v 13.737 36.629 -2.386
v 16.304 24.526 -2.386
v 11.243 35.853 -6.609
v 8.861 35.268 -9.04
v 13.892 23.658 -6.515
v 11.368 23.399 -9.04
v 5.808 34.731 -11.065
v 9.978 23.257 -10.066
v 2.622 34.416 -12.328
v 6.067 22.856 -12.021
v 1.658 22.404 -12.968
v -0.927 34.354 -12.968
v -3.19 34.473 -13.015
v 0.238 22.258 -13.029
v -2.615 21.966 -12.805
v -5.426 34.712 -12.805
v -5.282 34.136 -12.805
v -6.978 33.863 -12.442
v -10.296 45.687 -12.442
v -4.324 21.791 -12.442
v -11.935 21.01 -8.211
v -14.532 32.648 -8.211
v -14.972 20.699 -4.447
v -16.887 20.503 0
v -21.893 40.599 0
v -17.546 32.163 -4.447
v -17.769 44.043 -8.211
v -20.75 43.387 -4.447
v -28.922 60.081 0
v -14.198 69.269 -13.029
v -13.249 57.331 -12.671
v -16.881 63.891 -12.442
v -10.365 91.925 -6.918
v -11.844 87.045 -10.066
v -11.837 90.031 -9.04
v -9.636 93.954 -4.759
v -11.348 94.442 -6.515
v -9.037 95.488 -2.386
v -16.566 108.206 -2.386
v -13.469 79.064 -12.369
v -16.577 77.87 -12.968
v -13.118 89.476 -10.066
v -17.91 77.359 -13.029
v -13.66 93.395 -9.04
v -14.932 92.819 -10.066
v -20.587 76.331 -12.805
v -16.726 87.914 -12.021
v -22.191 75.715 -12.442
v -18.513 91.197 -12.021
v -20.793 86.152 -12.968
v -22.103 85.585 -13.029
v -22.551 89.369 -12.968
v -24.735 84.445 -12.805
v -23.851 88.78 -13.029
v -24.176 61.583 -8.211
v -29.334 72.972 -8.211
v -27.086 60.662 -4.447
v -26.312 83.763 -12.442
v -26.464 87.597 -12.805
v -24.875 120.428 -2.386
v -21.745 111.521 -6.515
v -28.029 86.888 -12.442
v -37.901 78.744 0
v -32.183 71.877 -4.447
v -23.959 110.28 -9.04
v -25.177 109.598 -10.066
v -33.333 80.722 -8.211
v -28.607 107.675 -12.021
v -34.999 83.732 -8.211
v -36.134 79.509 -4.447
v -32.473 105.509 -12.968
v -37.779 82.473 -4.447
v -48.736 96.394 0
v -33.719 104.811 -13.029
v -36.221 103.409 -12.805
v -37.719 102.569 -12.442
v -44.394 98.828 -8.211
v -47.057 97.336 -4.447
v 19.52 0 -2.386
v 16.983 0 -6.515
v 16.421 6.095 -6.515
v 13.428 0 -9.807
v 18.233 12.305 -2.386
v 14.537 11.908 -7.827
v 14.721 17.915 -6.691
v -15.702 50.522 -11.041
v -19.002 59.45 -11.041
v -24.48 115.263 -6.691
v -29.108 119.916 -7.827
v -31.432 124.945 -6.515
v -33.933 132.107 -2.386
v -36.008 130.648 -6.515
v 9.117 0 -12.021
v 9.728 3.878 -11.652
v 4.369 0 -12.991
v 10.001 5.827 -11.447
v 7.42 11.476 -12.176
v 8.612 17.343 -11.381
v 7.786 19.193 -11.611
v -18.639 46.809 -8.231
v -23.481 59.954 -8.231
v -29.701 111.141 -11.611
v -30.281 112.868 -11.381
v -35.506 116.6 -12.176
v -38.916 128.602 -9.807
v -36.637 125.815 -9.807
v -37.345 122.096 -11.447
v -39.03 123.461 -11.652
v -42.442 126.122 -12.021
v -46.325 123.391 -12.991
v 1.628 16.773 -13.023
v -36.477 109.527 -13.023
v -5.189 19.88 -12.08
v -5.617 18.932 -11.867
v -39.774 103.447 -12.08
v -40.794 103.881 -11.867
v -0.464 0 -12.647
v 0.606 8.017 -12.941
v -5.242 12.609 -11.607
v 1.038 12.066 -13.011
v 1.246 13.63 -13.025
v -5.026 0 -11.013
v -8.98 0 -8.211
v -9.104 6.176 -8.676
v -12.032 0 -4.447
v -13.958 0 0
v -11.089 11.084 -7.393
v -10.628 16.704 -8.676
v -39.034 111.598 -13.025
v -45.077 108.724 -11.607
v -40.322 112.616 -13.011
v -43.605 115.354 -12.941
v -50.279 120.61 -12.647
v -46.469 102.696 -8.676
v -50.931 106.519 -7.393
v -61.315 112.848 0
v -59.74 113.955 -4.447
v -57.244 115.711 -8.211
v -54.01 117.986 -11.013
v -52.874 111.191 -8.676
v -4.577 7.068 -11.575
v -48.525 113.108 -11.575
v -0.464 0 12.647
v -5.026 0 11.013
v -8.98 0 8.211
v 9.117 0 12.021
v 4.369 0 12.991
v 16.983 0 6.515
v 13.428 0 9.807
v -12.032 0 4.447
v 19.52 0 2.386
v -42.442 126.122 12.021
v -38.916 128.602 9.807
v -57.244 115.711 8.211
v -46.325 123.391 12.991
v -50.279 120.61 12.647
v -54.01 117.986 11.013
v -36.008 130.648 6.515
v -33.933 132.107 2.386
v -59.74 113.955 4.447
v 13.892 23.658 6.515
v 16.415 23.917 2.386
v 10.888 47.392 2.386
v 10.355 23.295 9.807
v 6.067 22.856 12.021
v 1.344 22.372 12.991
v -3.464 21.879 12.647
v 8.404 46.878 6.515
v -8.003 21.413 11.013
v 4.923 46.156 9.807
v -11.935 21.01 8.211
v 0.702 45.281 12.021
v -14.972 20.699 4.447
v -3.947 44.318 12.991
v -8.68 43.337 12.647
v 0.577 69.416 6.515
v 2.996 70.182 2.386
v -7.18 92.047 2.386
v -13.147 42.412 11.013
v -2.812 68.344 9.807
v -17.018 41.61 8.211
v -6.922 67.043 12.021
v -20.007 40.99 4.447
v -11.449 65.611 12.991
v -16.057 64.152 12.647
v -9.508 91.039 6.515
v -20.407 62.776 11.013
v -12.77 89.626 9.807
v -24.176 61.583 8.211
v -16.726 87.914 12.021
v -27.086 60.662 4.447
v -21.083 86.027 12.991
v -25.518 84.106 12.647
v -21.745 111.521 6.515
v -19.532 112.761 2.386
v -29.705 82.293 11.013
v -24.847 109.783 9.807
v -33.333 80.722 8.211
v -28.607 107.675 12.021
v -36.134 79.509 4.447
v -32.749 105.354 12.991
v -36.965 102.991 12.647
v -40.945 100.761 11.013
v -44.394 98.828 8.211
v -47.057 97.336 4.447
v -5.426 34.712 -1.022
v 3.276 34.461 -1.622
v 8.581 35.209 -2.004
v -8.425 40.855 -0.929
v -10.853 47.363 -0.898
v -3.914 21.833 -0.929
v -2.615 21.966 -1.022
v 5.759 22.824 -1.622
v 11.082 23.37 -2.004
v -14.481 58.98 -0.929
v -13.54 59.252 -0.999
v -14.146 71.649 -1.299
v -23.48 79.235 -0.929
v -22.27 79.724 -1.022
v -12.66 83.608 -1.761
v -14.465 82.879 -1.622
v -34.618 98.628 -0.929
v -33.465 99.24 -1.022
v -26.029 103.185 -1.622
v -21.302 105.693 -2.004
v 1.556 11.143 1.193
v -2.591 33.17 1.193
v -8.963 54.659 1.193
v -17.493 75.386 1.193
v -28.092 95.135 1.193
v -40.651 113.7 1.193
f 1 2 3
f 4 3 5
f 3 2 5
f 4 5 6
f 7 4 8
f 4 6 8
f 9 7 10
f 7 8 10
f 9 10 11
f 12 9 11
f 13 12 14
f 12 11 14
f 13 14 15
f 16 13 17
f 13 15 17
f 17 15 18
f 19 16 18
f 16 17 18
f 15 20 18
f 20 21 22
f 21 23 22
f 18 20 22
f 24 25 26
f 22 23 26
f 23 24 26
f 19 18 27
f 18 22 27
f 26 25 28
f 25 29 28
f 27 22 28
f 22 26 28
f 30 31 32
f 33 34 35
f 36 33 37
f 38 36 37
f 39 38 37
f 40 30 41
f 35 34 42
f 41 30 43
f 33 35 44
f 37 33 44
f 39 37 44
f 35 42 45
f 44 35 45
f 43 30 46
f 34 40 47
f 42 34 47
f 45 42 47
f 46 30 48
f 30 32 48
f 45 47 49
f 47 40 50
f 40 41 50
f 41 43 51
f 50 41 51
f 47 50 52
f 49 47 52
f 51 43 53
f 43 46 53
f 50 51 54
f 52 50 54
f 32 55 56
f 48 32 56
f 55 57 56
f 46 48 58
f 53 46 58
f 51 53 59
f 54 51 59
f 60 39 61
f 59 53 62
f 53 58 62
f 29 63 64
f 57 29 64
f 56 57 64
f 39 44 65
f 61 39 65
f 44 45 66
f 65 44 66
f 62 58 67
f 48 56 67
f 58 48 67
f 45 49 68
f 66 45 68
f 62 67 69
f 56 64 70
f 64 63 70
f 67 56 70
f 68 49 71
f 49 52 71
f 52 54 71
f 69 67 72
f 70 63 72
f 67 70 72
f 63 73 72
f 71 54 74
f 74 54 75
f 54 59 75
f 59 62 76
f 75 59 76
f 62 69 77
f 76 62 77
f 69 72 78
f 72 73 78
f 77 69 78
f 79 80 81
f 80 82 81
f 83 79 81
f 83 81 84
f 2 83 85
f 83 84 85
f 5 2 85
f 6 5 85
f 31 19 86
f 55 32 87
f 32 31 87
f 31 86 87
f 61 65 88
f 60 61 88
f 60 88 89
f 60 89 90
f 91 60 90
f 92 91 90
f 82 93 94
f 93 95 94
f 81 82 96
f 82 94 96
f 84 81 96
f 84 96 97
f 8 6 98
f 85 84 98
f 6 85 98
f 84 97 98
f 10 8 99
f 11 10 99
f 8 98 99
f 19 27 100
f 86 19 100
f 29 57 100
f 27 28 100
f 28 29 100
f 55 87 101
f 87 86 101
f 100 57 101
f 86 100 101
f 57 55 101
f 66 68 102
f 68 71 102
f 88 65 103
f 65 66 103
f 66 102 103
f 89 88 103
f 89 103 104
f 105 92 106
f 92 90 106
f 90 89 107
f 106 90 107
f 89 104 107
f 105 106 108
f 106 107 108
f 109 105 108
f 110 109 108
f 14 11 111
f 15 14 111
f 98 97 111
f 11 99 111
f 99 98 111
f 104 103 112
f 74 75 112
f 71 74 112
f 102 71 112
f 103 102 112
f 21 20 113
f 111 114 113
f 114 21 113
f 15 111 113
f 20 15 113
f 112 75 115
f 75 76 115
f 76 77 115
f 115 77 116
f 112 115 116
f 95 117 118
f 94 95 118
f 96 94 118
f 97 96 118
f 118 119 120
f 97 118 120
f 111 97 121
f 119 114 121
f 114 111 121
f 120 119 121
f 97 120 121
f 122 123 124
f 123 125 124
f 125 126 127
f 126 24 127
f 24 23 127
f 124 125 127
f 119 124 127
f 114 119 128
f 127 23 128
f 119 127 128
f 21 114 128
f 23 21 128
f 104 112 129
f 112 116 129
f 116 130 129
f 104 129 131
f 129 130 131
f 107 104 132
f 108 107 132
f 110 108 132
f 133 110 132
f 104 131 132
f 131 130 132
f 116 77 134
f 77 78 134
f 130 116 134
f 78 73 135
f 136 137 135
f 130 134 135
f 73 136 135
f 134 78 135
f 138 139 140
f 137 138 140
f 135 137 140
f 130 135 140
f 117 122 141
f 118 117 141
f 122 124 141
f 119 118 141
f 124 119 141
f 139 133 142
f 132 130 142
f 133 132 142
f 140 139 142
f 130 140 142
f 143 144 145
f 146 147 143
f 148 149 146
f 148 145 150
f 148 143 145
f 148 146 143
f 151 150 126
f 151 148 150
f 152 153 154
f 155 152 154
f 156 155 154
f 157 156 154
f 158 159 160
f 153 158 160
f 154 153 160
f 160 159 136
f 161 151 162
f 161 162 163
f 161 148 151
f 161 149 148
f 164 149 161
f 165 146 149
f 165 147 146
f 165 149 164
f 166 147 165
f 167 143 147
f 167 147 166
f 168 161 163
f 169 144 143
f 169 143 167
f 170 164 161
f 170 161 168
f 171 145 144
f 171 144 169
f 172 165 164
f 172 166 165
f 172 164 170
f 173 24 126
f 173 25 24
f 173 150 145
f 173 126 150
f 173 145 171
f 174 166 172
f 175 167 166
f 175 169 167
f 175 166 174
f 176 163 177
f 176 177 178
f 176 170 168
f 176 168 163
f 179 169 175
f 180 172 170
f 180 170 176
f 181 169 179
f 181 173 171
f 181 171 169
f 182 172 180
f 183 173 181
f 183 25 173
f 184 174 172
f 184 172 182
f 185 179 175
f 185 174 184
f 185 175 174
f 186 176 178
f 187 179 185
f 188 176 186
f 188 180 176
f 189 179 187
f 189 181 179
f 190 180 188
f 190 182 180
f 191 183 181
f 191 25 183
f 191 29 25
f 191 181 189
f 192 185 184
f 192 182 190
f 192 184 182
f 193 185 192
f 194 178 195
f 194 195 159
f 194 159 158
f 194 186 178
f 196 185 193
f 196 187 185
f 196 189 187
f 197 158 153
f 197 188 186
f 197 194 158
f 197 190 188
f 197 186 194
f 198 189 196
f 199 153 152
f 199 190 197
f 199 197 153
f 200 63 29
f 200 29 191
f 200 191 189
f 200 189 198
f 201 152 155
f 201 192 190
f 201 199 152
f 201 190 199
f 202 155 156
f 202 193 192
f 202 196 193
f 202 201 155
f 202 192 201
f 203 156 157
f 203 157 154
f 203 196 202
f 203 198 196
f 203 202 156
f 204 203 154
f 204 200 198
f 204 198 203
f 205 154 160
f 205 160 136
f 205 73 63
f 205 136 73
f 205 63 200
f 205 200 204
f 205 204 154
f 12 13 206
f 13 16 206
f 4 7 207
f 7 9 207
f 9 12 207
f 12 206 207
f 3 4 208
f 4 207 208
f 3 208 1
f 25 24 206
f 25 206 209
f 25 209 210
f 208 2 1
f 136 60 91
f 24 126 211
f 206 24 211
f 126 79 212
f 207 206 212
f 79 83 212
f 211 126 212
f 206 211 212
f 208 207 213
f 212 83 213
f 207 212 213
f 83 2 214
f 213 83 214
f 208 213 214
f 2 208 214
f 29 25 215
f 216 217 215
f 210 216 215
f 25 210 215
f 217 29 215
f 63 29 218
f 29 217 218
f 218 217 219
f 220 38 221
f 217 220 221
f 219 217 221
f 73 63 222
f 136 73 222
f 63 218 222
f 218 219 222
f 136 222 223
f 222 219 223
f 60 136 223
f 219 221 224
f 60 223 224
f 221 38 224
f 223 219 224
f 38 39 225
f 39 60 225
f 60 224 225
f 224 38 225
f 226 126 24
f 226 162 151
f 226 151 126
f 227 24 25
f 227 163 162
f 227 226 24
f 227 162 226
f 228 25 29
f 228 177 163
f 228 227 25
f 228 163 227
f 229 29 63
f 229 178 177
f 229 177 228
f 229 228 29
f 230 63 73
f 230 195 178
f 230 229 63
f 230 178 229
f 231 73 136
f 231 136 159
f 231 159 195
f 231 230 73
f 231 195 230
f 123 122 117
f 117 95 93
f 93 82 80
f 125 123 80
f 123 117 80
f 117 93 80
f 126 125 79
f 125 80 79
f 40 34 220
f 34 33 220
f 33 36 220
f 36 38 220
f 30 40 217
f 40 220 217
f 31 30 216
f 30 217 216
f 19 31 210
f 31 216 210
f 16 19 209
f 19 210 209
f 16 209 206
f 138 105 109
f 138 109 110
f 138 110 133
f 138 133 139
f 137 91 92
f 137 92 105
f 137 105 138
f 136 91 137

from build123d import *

# Parameters (mm, degrees)
F5_DEPTH = 19.685


with BuildPart() as f2:
    # F2: sweep along a path in F1
    with BuildLine(Plane.XY) as f2_path:
        ThreePointArc((2.5794103276, 0), (-13.1552361752, 65.0705018825), (-47.7892048657, 122.361317277))
    # F0 (on Front) → F2 (sweep)
    with BuildSketch(Plane.XZ):
        with BuildLine():
            Line((-13.9575442299, 0), (19.5197295398, 2.3856847547))
            ThreePointArc((19.5197295398, 2.3856847547), (1.9408124217, 12.9841284446), (-13.9575442299, 0))
        make_face()
    sweep(path=f2_path.line)


with BuildPart() as f3_1:
    # F3: instance of F2
    add(f2.part.mirror(Plane.XY))

    # F4 (on Top) → F5 (cut, symmetric)
    with BuildSketch(Plane.XY):
        with BuildLine():
            ThreePointArc((41.7517051101, 74.454382062), (28.6847679393, 100.99919665), (2.3437023629, 114.472143352))
            ThreePointArc((2.3437023629, 114.472143352), (-13.8641041279, 75.7926532577), (-5.4263374768, 34.7122438252))
            ThreePointArc((-5.4263374768, 34.7122438252), (26.9606147491, 44.1392558641), (41.7517051101, 74.454382062))
        make_face()
    extrude(amount=F5_DEPTH, both=True, mode=Mode.SUBTRACT)


solid = Compound([f2.part, f3_1.part])
